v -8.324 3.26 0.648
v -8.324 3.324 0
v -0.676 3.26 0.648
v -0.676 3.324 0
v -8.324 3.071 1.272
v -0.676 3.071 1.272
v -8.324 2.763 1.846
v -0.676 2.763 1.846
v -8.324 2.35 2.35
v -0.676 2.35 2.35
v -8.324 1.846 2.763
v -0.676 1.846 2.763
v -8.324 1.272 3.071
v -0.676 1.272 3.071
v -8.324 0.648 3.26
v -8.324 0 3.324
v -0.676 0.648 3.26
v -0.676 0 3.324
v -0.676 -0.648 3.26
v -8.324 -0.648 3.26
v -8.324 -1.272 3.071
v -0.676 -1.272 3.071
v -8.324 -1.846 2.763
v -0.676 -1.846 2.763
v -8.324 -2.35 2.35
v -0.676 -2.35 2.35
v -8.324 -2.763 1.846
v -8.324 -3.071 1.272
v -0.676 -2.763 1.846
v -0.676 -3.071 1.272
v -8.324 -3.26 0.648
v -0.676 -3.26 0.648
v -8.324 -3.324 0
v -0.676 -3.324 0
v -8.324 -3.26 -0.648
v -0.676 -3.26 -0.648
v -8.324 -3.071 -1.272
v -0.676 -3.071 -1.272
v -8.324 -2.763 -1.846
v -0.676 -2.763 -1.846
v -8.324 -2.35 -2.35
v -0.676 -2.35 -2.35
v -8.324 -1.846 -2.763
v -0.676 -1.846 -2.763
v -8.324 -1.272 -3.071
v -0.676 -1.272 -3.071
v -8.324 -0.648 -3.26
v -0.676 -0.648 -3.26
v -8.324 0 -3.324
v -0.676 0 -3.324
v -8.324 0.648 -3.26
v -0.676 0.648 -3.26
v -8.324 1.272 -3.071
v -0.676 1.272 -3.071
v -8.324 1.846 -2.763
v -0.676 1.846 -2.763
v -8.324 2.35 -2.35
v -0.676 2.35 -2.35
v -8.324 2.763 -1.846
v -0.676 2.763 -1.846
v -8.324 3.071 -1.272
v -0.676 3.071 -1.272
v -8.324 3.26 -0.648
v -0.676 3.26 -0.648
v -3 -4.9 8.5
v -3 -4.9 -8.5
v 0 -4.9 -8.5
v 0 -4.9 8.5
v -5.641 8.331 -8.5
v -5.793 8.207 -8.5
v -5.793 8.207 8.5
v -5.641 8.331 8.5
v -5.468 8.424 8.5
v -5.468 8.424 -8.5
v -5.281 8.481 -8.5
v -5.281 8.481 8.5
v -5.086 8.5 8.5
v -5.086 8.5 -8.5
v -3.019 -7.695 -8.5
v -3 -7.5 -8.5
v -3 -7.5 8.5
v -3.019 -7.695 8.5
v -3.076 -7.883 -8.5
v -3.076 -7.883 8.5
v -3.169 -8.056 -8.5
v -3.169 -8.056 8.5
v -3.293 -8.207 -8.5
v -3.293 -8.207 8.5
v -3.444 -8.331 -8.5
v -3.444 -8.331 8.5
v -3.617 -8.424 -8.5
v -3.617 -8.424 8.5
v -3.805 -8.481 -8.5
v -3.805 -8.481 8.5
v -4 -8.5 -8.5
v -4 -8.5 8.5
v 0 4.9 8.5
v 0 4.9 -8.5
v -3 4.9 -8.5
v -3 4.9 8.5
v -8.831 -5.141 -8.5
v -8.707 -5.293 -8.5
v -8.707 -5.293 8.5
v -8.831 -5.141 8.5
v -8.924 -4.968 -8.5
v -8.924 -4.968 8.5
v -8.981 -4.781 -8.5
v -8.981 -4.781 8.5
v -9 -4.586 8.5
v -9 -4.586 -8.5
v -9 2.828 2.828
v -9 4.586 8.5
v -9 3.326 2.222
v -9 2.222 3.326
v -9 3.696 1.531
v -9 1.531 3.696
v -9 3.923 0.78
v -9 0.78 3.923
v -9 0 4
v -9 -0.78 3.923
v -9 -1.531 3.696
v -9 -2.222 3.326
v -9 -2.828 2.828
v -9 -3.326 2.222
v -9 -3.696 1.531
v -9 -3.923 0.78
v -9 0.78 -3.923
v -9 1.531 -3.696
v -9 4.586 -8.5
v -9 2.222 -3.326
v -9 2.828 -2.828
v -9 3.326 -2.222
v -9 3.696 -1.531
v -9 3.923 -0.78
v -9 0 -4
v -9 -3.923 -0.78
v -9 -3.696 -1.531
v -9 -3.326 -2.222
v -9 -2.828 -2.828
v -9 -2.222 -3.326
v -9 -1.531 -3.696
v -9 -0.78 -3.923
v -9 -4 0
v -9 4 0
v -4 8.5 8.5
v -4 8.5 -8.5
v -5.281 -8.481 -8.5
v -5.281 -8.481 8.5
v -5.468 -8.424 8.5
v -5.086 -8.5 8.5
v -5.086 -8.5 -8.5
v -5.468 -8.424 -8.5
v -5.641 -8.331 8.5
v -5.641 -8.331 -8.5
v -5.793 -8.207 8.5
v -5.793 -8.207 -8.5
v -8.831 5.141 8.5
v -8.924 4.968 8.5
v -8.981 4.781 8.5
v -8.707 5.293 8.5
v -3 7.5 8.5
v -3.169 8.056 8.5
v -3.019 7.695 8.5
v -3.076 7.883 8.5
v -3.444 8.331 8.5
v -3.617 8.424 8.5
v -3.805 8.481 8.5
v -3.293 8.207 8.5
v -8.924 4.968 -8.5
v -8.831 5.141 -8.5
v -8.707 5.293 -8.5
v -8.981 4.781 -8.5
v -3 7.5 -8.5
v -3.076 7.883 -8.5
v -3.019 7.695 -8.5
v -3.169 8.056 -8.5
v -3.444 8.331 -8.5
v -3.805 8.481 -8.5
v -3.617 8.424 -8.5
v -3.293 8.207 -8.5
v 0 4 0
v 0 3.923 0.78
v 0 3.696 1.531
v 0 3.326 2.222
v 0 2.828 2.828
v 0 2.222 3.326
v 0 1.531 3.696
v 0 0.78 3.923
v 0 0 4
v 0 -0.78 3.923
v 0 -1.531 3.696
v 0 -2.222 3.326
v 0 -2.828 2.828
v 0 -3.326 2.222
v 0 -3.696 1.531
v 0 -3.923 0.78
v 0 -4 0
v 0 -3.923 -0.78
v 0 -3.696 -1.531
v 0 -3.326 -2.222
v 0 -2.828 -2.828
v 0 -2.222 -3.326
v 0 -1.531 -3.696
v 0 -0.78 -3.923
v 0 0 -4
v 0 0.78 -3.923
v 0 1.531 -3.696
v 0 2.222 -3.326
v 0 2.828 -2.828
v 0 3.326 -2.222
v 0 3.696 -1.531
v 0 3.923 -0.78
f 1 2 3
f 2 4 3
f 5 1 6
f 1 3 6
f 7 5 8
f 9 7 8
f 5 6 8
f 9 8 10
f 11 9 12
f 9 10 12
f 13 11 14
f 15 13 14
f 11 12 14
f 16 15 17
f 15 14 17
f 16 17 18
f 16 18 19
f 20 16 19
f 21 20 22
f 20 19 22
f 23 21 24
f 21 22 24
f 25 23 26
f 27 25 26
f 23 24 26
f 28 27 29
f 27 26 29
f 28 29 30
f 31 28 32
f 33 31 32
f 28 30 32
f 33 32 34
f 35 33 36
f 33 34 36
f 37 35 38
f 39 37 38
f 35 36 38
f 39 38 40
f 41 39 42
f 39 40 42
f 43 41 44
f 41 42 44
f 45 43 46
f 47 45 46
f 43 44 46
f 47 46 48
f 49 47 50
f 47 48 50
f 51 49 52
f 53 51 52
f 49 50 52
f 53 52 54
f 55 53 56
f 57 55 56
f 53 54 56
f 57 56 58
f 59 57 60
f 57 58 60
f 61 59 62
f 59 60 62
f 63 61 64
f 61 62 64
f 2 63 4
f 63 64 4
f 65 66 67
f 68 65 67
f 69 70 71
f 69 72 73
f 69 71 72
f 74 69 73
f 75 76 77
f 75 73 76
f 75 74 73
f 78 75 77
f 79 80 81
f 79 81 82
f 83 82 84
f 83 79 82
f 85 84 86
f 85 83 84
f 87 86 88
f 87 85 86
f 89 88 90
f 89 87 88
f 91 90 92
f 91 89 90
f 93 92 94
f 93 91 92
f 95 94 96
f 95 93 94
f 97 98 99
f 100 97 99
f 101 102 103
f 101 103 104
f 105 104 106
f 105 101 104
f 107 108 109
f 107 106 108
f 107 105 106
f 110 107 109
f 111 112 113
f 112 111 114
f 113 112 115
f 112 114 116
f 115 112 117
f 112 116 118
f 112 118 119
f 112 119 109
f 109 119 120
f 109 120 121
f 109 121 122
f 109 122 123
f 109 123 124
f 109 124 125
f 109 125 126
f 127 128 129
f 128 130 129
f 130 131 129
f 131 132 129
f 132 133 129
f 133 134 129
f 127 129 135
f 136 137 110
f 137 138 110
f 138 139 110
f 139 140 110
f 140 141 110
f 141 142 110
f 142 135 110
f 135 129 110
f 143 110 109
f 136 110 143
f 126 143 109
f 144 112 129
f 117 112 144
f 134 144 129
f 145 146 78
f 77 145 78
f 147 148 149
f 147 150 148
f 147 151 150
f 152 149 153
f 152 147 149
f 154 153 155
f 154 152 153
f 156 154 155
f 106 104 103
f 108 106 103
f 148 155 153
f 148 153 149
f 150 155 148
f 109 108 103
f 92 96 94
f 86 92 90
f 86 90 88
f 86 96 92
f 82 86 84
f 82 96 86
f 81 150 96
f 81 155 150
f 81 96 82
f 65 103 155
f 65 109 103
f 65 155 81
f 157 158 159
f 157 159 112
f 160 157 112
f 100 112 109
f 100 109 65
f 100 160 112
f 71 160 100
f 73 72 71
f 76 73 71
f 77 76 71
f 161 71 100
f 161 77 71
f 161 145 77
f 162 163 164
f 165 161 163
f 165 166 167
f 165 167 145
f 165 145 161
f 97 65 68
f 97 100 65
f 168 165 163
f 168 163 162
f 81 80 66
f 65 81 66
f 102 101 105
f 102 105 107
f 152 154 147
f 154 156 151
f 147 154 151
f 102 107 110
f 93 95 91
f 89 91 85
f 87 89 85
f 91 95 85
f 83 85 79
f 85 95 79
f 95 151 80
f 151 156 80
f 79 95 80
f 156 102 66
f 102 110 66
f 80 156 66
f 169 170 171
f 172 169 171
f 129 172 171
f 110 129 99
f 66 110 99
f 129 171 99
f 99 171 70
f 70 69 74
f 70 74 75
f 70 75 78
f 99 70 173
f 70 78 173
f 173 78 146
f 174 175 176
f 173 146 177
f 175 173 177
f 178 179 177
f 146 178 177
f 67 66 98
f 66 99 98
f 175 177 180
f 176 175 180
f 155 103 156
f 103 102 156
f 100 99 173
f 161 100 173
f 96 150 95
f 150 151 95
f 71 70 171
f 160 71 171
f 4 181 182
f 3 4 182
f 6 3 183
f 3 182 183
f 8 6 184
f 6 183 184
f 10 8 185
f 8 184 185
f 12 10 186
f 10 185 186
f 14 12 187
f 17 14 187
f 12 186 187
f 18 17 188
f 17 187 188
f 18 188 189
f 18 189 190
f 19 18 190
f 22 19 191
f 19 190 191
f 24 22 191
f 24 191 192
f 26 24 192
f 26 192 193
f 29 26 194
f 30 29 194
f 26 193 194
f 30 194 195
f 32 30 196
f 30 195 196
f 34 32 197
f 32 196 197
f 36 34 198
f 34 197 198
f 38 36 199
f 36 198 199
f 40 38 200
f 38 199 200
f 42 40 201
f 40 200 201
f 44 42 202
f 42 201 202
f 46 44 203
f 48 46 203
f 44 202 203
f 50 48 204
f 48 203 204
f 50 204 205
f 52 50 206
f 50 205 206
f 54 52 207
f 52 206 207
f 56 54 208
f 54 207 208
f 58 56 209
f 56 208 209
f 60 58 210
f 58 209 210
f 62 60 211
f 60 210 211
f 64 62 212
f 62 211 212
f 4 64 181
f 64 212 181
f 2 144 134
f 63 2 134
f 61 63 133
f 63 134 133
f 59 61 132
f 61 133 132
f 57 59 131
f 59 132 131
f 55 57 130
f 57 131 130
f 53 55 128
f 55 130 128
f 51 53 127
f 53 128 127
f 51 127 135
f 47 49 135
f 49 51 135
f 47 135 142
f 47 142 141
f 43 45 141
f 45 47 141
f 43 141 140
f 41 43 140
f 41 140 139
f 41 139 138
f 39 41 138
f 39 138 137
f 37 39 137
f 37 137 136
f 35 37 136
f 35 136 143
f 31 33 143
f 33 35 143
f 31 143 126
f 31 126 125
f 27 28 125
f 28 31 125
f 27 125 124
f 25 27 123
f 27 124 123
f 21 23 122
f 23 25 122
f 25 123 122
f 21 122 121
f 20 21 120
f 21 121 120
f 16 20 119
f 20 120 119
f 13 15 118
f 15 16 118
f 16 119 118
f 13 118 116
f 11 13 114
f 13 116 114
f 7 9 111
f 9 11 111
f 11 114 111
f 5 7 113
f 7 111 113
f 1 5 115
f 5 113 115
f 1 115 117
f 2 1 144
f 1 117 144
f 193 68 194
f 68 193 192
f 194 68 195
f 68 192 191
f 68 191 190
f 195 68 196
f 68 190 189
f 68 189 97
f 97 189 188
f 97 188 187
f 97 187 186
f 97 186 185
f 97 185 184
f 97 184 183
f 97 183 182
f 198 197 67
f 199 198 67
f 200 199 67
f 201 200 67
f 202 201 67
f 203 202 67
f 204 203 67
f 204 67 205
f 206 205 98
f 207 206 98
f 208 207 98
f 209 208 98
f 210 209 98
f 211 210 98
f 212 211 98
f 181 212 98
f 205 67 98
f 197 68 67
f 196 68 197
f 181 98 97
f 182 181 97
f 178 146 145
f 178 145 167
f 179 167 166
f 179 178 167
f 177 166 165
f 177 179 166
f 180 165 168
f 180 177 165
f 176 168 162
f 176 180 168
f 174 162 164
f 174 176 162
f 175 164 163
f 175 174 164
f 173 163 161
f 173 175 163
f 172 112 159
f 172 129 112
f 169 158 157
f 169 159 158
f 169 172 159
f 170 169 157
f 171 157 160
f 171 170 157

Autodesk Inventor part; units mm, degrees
sketch "Sketch_1" plane through (0, 0, 0) normal (0, 0, 1) x (1, 0, 0)
  arc A0 (-9, -4.5858) -> (-8.7071, -5.2929) centre (-8, -4.5858) ccw
  line L0 (-8.7071, -5.2929) -> (-5.7929, -8.2071)
  arc A1 (-5.7929, -8.2071) -> (-5.0858, -8.5) centre (-5.0858, -7.5) ccw
  line L1 (-5.0858, -8.5) -> (-4, -8.5)
  arc A2 (-4, -8.5) -> (-3, -7.5) centre (-4, -7.5) ccw
  line L2 (-3, -7.5) -> (-3, -4.9)
  line L3 (-3, -4.9) -> (0, -4.9)
  line L4 (0, -4.9) -> (0, 4.9)
  line L5 (0, 4.9) -> (-3, 4.9)
  line L6 (-3, 4.9) -> (-3, 7.5)
  arc A3 (-3, 7.5) -> (-4, 8.5) centre (-4, 7.5) ccw
  line L7 (-4, 8.5) -> (-5.0858, 8.5)
  arc A4 (-5.0858, 8.5) -> (-5.7929, 8.2071) centre (-5.0858, 7.5) ccw
  line L8 (-5.7929, 8.2071) -> (-8.7071, 5.2929)
  arc A5 (-8.7071, 5.2929) -> (-9, 4.5858) centre (-8, 4.5858) ccw
  line L9 (-9, 4.5858) -> (-9, -4.5858)
extrude "Extrusion1" add sketch "Sketch_1" along normal mid plane 17
sketch "Sketch_5" plane through (0, 0, 0) normal (0, 0, 1) x (1, 0, 0)
  line L0 (0, 0) -> (-9, 0)
  line L1 (-9, 0) -> (-9, 4)
  line L2 (-9, 4) -> (-8.3235, 3.3235)
  line L3 (-8.3235, 3.3235) -> (-0.6765, 3.3235)
  line L4 (-0.6765, 3.3235) -> (0, 4)
  line L5 (0, 4) -> (0, 0)
  line L6 (0, 0) -> (-9, 0)
revolve "Revolution1" cut sketch "Sketch_5" angle 360 about axis through (0, 0, 0) along (1, 0, 0)
thread "Thread1" size "M8x1.25" class "6H" standard "ISO Metric profile" full length
ref_plane "nut_XY" through (0, 0, 0) normal (1, 0, 0) x (0, 0, -1)
ref_plane "nut_YZ" through (0, 0, 0) normal (0, 0, -1) x (0, 1, 0)
ref_plane "nut_ZX" through (0, 0, 0) normal (0, 1, 0) x (1, 0, 0)
ref_plane "to_bolt_XY" through (-9, 0, 0) normal (1, 0, 0) x (0, 0, -1)
ref_plane "to_bolt_YZ" through (-9, 0, 0) normal (0, 0, -1) x (0, 1, 0)
ref_plane "to_bolt_ZX" through (-9, 0, 0) normal (0, 1, 0) x (1, 0, 0)
ref_plane "to_frames_XY" through (-3, 0, 0) normal (1, 0, 0) x (0, 0, -1)
ref_plane "to_frames_YZ" through (-3, 0, 0) normal (0, 0, -1) x (0, 1, 0)
ref_plane "to_frames_ZX" through (-3, 0, 0) normal (0, 1, 0) x (1, 0, 0)
properties part number "HNTT8-8"
